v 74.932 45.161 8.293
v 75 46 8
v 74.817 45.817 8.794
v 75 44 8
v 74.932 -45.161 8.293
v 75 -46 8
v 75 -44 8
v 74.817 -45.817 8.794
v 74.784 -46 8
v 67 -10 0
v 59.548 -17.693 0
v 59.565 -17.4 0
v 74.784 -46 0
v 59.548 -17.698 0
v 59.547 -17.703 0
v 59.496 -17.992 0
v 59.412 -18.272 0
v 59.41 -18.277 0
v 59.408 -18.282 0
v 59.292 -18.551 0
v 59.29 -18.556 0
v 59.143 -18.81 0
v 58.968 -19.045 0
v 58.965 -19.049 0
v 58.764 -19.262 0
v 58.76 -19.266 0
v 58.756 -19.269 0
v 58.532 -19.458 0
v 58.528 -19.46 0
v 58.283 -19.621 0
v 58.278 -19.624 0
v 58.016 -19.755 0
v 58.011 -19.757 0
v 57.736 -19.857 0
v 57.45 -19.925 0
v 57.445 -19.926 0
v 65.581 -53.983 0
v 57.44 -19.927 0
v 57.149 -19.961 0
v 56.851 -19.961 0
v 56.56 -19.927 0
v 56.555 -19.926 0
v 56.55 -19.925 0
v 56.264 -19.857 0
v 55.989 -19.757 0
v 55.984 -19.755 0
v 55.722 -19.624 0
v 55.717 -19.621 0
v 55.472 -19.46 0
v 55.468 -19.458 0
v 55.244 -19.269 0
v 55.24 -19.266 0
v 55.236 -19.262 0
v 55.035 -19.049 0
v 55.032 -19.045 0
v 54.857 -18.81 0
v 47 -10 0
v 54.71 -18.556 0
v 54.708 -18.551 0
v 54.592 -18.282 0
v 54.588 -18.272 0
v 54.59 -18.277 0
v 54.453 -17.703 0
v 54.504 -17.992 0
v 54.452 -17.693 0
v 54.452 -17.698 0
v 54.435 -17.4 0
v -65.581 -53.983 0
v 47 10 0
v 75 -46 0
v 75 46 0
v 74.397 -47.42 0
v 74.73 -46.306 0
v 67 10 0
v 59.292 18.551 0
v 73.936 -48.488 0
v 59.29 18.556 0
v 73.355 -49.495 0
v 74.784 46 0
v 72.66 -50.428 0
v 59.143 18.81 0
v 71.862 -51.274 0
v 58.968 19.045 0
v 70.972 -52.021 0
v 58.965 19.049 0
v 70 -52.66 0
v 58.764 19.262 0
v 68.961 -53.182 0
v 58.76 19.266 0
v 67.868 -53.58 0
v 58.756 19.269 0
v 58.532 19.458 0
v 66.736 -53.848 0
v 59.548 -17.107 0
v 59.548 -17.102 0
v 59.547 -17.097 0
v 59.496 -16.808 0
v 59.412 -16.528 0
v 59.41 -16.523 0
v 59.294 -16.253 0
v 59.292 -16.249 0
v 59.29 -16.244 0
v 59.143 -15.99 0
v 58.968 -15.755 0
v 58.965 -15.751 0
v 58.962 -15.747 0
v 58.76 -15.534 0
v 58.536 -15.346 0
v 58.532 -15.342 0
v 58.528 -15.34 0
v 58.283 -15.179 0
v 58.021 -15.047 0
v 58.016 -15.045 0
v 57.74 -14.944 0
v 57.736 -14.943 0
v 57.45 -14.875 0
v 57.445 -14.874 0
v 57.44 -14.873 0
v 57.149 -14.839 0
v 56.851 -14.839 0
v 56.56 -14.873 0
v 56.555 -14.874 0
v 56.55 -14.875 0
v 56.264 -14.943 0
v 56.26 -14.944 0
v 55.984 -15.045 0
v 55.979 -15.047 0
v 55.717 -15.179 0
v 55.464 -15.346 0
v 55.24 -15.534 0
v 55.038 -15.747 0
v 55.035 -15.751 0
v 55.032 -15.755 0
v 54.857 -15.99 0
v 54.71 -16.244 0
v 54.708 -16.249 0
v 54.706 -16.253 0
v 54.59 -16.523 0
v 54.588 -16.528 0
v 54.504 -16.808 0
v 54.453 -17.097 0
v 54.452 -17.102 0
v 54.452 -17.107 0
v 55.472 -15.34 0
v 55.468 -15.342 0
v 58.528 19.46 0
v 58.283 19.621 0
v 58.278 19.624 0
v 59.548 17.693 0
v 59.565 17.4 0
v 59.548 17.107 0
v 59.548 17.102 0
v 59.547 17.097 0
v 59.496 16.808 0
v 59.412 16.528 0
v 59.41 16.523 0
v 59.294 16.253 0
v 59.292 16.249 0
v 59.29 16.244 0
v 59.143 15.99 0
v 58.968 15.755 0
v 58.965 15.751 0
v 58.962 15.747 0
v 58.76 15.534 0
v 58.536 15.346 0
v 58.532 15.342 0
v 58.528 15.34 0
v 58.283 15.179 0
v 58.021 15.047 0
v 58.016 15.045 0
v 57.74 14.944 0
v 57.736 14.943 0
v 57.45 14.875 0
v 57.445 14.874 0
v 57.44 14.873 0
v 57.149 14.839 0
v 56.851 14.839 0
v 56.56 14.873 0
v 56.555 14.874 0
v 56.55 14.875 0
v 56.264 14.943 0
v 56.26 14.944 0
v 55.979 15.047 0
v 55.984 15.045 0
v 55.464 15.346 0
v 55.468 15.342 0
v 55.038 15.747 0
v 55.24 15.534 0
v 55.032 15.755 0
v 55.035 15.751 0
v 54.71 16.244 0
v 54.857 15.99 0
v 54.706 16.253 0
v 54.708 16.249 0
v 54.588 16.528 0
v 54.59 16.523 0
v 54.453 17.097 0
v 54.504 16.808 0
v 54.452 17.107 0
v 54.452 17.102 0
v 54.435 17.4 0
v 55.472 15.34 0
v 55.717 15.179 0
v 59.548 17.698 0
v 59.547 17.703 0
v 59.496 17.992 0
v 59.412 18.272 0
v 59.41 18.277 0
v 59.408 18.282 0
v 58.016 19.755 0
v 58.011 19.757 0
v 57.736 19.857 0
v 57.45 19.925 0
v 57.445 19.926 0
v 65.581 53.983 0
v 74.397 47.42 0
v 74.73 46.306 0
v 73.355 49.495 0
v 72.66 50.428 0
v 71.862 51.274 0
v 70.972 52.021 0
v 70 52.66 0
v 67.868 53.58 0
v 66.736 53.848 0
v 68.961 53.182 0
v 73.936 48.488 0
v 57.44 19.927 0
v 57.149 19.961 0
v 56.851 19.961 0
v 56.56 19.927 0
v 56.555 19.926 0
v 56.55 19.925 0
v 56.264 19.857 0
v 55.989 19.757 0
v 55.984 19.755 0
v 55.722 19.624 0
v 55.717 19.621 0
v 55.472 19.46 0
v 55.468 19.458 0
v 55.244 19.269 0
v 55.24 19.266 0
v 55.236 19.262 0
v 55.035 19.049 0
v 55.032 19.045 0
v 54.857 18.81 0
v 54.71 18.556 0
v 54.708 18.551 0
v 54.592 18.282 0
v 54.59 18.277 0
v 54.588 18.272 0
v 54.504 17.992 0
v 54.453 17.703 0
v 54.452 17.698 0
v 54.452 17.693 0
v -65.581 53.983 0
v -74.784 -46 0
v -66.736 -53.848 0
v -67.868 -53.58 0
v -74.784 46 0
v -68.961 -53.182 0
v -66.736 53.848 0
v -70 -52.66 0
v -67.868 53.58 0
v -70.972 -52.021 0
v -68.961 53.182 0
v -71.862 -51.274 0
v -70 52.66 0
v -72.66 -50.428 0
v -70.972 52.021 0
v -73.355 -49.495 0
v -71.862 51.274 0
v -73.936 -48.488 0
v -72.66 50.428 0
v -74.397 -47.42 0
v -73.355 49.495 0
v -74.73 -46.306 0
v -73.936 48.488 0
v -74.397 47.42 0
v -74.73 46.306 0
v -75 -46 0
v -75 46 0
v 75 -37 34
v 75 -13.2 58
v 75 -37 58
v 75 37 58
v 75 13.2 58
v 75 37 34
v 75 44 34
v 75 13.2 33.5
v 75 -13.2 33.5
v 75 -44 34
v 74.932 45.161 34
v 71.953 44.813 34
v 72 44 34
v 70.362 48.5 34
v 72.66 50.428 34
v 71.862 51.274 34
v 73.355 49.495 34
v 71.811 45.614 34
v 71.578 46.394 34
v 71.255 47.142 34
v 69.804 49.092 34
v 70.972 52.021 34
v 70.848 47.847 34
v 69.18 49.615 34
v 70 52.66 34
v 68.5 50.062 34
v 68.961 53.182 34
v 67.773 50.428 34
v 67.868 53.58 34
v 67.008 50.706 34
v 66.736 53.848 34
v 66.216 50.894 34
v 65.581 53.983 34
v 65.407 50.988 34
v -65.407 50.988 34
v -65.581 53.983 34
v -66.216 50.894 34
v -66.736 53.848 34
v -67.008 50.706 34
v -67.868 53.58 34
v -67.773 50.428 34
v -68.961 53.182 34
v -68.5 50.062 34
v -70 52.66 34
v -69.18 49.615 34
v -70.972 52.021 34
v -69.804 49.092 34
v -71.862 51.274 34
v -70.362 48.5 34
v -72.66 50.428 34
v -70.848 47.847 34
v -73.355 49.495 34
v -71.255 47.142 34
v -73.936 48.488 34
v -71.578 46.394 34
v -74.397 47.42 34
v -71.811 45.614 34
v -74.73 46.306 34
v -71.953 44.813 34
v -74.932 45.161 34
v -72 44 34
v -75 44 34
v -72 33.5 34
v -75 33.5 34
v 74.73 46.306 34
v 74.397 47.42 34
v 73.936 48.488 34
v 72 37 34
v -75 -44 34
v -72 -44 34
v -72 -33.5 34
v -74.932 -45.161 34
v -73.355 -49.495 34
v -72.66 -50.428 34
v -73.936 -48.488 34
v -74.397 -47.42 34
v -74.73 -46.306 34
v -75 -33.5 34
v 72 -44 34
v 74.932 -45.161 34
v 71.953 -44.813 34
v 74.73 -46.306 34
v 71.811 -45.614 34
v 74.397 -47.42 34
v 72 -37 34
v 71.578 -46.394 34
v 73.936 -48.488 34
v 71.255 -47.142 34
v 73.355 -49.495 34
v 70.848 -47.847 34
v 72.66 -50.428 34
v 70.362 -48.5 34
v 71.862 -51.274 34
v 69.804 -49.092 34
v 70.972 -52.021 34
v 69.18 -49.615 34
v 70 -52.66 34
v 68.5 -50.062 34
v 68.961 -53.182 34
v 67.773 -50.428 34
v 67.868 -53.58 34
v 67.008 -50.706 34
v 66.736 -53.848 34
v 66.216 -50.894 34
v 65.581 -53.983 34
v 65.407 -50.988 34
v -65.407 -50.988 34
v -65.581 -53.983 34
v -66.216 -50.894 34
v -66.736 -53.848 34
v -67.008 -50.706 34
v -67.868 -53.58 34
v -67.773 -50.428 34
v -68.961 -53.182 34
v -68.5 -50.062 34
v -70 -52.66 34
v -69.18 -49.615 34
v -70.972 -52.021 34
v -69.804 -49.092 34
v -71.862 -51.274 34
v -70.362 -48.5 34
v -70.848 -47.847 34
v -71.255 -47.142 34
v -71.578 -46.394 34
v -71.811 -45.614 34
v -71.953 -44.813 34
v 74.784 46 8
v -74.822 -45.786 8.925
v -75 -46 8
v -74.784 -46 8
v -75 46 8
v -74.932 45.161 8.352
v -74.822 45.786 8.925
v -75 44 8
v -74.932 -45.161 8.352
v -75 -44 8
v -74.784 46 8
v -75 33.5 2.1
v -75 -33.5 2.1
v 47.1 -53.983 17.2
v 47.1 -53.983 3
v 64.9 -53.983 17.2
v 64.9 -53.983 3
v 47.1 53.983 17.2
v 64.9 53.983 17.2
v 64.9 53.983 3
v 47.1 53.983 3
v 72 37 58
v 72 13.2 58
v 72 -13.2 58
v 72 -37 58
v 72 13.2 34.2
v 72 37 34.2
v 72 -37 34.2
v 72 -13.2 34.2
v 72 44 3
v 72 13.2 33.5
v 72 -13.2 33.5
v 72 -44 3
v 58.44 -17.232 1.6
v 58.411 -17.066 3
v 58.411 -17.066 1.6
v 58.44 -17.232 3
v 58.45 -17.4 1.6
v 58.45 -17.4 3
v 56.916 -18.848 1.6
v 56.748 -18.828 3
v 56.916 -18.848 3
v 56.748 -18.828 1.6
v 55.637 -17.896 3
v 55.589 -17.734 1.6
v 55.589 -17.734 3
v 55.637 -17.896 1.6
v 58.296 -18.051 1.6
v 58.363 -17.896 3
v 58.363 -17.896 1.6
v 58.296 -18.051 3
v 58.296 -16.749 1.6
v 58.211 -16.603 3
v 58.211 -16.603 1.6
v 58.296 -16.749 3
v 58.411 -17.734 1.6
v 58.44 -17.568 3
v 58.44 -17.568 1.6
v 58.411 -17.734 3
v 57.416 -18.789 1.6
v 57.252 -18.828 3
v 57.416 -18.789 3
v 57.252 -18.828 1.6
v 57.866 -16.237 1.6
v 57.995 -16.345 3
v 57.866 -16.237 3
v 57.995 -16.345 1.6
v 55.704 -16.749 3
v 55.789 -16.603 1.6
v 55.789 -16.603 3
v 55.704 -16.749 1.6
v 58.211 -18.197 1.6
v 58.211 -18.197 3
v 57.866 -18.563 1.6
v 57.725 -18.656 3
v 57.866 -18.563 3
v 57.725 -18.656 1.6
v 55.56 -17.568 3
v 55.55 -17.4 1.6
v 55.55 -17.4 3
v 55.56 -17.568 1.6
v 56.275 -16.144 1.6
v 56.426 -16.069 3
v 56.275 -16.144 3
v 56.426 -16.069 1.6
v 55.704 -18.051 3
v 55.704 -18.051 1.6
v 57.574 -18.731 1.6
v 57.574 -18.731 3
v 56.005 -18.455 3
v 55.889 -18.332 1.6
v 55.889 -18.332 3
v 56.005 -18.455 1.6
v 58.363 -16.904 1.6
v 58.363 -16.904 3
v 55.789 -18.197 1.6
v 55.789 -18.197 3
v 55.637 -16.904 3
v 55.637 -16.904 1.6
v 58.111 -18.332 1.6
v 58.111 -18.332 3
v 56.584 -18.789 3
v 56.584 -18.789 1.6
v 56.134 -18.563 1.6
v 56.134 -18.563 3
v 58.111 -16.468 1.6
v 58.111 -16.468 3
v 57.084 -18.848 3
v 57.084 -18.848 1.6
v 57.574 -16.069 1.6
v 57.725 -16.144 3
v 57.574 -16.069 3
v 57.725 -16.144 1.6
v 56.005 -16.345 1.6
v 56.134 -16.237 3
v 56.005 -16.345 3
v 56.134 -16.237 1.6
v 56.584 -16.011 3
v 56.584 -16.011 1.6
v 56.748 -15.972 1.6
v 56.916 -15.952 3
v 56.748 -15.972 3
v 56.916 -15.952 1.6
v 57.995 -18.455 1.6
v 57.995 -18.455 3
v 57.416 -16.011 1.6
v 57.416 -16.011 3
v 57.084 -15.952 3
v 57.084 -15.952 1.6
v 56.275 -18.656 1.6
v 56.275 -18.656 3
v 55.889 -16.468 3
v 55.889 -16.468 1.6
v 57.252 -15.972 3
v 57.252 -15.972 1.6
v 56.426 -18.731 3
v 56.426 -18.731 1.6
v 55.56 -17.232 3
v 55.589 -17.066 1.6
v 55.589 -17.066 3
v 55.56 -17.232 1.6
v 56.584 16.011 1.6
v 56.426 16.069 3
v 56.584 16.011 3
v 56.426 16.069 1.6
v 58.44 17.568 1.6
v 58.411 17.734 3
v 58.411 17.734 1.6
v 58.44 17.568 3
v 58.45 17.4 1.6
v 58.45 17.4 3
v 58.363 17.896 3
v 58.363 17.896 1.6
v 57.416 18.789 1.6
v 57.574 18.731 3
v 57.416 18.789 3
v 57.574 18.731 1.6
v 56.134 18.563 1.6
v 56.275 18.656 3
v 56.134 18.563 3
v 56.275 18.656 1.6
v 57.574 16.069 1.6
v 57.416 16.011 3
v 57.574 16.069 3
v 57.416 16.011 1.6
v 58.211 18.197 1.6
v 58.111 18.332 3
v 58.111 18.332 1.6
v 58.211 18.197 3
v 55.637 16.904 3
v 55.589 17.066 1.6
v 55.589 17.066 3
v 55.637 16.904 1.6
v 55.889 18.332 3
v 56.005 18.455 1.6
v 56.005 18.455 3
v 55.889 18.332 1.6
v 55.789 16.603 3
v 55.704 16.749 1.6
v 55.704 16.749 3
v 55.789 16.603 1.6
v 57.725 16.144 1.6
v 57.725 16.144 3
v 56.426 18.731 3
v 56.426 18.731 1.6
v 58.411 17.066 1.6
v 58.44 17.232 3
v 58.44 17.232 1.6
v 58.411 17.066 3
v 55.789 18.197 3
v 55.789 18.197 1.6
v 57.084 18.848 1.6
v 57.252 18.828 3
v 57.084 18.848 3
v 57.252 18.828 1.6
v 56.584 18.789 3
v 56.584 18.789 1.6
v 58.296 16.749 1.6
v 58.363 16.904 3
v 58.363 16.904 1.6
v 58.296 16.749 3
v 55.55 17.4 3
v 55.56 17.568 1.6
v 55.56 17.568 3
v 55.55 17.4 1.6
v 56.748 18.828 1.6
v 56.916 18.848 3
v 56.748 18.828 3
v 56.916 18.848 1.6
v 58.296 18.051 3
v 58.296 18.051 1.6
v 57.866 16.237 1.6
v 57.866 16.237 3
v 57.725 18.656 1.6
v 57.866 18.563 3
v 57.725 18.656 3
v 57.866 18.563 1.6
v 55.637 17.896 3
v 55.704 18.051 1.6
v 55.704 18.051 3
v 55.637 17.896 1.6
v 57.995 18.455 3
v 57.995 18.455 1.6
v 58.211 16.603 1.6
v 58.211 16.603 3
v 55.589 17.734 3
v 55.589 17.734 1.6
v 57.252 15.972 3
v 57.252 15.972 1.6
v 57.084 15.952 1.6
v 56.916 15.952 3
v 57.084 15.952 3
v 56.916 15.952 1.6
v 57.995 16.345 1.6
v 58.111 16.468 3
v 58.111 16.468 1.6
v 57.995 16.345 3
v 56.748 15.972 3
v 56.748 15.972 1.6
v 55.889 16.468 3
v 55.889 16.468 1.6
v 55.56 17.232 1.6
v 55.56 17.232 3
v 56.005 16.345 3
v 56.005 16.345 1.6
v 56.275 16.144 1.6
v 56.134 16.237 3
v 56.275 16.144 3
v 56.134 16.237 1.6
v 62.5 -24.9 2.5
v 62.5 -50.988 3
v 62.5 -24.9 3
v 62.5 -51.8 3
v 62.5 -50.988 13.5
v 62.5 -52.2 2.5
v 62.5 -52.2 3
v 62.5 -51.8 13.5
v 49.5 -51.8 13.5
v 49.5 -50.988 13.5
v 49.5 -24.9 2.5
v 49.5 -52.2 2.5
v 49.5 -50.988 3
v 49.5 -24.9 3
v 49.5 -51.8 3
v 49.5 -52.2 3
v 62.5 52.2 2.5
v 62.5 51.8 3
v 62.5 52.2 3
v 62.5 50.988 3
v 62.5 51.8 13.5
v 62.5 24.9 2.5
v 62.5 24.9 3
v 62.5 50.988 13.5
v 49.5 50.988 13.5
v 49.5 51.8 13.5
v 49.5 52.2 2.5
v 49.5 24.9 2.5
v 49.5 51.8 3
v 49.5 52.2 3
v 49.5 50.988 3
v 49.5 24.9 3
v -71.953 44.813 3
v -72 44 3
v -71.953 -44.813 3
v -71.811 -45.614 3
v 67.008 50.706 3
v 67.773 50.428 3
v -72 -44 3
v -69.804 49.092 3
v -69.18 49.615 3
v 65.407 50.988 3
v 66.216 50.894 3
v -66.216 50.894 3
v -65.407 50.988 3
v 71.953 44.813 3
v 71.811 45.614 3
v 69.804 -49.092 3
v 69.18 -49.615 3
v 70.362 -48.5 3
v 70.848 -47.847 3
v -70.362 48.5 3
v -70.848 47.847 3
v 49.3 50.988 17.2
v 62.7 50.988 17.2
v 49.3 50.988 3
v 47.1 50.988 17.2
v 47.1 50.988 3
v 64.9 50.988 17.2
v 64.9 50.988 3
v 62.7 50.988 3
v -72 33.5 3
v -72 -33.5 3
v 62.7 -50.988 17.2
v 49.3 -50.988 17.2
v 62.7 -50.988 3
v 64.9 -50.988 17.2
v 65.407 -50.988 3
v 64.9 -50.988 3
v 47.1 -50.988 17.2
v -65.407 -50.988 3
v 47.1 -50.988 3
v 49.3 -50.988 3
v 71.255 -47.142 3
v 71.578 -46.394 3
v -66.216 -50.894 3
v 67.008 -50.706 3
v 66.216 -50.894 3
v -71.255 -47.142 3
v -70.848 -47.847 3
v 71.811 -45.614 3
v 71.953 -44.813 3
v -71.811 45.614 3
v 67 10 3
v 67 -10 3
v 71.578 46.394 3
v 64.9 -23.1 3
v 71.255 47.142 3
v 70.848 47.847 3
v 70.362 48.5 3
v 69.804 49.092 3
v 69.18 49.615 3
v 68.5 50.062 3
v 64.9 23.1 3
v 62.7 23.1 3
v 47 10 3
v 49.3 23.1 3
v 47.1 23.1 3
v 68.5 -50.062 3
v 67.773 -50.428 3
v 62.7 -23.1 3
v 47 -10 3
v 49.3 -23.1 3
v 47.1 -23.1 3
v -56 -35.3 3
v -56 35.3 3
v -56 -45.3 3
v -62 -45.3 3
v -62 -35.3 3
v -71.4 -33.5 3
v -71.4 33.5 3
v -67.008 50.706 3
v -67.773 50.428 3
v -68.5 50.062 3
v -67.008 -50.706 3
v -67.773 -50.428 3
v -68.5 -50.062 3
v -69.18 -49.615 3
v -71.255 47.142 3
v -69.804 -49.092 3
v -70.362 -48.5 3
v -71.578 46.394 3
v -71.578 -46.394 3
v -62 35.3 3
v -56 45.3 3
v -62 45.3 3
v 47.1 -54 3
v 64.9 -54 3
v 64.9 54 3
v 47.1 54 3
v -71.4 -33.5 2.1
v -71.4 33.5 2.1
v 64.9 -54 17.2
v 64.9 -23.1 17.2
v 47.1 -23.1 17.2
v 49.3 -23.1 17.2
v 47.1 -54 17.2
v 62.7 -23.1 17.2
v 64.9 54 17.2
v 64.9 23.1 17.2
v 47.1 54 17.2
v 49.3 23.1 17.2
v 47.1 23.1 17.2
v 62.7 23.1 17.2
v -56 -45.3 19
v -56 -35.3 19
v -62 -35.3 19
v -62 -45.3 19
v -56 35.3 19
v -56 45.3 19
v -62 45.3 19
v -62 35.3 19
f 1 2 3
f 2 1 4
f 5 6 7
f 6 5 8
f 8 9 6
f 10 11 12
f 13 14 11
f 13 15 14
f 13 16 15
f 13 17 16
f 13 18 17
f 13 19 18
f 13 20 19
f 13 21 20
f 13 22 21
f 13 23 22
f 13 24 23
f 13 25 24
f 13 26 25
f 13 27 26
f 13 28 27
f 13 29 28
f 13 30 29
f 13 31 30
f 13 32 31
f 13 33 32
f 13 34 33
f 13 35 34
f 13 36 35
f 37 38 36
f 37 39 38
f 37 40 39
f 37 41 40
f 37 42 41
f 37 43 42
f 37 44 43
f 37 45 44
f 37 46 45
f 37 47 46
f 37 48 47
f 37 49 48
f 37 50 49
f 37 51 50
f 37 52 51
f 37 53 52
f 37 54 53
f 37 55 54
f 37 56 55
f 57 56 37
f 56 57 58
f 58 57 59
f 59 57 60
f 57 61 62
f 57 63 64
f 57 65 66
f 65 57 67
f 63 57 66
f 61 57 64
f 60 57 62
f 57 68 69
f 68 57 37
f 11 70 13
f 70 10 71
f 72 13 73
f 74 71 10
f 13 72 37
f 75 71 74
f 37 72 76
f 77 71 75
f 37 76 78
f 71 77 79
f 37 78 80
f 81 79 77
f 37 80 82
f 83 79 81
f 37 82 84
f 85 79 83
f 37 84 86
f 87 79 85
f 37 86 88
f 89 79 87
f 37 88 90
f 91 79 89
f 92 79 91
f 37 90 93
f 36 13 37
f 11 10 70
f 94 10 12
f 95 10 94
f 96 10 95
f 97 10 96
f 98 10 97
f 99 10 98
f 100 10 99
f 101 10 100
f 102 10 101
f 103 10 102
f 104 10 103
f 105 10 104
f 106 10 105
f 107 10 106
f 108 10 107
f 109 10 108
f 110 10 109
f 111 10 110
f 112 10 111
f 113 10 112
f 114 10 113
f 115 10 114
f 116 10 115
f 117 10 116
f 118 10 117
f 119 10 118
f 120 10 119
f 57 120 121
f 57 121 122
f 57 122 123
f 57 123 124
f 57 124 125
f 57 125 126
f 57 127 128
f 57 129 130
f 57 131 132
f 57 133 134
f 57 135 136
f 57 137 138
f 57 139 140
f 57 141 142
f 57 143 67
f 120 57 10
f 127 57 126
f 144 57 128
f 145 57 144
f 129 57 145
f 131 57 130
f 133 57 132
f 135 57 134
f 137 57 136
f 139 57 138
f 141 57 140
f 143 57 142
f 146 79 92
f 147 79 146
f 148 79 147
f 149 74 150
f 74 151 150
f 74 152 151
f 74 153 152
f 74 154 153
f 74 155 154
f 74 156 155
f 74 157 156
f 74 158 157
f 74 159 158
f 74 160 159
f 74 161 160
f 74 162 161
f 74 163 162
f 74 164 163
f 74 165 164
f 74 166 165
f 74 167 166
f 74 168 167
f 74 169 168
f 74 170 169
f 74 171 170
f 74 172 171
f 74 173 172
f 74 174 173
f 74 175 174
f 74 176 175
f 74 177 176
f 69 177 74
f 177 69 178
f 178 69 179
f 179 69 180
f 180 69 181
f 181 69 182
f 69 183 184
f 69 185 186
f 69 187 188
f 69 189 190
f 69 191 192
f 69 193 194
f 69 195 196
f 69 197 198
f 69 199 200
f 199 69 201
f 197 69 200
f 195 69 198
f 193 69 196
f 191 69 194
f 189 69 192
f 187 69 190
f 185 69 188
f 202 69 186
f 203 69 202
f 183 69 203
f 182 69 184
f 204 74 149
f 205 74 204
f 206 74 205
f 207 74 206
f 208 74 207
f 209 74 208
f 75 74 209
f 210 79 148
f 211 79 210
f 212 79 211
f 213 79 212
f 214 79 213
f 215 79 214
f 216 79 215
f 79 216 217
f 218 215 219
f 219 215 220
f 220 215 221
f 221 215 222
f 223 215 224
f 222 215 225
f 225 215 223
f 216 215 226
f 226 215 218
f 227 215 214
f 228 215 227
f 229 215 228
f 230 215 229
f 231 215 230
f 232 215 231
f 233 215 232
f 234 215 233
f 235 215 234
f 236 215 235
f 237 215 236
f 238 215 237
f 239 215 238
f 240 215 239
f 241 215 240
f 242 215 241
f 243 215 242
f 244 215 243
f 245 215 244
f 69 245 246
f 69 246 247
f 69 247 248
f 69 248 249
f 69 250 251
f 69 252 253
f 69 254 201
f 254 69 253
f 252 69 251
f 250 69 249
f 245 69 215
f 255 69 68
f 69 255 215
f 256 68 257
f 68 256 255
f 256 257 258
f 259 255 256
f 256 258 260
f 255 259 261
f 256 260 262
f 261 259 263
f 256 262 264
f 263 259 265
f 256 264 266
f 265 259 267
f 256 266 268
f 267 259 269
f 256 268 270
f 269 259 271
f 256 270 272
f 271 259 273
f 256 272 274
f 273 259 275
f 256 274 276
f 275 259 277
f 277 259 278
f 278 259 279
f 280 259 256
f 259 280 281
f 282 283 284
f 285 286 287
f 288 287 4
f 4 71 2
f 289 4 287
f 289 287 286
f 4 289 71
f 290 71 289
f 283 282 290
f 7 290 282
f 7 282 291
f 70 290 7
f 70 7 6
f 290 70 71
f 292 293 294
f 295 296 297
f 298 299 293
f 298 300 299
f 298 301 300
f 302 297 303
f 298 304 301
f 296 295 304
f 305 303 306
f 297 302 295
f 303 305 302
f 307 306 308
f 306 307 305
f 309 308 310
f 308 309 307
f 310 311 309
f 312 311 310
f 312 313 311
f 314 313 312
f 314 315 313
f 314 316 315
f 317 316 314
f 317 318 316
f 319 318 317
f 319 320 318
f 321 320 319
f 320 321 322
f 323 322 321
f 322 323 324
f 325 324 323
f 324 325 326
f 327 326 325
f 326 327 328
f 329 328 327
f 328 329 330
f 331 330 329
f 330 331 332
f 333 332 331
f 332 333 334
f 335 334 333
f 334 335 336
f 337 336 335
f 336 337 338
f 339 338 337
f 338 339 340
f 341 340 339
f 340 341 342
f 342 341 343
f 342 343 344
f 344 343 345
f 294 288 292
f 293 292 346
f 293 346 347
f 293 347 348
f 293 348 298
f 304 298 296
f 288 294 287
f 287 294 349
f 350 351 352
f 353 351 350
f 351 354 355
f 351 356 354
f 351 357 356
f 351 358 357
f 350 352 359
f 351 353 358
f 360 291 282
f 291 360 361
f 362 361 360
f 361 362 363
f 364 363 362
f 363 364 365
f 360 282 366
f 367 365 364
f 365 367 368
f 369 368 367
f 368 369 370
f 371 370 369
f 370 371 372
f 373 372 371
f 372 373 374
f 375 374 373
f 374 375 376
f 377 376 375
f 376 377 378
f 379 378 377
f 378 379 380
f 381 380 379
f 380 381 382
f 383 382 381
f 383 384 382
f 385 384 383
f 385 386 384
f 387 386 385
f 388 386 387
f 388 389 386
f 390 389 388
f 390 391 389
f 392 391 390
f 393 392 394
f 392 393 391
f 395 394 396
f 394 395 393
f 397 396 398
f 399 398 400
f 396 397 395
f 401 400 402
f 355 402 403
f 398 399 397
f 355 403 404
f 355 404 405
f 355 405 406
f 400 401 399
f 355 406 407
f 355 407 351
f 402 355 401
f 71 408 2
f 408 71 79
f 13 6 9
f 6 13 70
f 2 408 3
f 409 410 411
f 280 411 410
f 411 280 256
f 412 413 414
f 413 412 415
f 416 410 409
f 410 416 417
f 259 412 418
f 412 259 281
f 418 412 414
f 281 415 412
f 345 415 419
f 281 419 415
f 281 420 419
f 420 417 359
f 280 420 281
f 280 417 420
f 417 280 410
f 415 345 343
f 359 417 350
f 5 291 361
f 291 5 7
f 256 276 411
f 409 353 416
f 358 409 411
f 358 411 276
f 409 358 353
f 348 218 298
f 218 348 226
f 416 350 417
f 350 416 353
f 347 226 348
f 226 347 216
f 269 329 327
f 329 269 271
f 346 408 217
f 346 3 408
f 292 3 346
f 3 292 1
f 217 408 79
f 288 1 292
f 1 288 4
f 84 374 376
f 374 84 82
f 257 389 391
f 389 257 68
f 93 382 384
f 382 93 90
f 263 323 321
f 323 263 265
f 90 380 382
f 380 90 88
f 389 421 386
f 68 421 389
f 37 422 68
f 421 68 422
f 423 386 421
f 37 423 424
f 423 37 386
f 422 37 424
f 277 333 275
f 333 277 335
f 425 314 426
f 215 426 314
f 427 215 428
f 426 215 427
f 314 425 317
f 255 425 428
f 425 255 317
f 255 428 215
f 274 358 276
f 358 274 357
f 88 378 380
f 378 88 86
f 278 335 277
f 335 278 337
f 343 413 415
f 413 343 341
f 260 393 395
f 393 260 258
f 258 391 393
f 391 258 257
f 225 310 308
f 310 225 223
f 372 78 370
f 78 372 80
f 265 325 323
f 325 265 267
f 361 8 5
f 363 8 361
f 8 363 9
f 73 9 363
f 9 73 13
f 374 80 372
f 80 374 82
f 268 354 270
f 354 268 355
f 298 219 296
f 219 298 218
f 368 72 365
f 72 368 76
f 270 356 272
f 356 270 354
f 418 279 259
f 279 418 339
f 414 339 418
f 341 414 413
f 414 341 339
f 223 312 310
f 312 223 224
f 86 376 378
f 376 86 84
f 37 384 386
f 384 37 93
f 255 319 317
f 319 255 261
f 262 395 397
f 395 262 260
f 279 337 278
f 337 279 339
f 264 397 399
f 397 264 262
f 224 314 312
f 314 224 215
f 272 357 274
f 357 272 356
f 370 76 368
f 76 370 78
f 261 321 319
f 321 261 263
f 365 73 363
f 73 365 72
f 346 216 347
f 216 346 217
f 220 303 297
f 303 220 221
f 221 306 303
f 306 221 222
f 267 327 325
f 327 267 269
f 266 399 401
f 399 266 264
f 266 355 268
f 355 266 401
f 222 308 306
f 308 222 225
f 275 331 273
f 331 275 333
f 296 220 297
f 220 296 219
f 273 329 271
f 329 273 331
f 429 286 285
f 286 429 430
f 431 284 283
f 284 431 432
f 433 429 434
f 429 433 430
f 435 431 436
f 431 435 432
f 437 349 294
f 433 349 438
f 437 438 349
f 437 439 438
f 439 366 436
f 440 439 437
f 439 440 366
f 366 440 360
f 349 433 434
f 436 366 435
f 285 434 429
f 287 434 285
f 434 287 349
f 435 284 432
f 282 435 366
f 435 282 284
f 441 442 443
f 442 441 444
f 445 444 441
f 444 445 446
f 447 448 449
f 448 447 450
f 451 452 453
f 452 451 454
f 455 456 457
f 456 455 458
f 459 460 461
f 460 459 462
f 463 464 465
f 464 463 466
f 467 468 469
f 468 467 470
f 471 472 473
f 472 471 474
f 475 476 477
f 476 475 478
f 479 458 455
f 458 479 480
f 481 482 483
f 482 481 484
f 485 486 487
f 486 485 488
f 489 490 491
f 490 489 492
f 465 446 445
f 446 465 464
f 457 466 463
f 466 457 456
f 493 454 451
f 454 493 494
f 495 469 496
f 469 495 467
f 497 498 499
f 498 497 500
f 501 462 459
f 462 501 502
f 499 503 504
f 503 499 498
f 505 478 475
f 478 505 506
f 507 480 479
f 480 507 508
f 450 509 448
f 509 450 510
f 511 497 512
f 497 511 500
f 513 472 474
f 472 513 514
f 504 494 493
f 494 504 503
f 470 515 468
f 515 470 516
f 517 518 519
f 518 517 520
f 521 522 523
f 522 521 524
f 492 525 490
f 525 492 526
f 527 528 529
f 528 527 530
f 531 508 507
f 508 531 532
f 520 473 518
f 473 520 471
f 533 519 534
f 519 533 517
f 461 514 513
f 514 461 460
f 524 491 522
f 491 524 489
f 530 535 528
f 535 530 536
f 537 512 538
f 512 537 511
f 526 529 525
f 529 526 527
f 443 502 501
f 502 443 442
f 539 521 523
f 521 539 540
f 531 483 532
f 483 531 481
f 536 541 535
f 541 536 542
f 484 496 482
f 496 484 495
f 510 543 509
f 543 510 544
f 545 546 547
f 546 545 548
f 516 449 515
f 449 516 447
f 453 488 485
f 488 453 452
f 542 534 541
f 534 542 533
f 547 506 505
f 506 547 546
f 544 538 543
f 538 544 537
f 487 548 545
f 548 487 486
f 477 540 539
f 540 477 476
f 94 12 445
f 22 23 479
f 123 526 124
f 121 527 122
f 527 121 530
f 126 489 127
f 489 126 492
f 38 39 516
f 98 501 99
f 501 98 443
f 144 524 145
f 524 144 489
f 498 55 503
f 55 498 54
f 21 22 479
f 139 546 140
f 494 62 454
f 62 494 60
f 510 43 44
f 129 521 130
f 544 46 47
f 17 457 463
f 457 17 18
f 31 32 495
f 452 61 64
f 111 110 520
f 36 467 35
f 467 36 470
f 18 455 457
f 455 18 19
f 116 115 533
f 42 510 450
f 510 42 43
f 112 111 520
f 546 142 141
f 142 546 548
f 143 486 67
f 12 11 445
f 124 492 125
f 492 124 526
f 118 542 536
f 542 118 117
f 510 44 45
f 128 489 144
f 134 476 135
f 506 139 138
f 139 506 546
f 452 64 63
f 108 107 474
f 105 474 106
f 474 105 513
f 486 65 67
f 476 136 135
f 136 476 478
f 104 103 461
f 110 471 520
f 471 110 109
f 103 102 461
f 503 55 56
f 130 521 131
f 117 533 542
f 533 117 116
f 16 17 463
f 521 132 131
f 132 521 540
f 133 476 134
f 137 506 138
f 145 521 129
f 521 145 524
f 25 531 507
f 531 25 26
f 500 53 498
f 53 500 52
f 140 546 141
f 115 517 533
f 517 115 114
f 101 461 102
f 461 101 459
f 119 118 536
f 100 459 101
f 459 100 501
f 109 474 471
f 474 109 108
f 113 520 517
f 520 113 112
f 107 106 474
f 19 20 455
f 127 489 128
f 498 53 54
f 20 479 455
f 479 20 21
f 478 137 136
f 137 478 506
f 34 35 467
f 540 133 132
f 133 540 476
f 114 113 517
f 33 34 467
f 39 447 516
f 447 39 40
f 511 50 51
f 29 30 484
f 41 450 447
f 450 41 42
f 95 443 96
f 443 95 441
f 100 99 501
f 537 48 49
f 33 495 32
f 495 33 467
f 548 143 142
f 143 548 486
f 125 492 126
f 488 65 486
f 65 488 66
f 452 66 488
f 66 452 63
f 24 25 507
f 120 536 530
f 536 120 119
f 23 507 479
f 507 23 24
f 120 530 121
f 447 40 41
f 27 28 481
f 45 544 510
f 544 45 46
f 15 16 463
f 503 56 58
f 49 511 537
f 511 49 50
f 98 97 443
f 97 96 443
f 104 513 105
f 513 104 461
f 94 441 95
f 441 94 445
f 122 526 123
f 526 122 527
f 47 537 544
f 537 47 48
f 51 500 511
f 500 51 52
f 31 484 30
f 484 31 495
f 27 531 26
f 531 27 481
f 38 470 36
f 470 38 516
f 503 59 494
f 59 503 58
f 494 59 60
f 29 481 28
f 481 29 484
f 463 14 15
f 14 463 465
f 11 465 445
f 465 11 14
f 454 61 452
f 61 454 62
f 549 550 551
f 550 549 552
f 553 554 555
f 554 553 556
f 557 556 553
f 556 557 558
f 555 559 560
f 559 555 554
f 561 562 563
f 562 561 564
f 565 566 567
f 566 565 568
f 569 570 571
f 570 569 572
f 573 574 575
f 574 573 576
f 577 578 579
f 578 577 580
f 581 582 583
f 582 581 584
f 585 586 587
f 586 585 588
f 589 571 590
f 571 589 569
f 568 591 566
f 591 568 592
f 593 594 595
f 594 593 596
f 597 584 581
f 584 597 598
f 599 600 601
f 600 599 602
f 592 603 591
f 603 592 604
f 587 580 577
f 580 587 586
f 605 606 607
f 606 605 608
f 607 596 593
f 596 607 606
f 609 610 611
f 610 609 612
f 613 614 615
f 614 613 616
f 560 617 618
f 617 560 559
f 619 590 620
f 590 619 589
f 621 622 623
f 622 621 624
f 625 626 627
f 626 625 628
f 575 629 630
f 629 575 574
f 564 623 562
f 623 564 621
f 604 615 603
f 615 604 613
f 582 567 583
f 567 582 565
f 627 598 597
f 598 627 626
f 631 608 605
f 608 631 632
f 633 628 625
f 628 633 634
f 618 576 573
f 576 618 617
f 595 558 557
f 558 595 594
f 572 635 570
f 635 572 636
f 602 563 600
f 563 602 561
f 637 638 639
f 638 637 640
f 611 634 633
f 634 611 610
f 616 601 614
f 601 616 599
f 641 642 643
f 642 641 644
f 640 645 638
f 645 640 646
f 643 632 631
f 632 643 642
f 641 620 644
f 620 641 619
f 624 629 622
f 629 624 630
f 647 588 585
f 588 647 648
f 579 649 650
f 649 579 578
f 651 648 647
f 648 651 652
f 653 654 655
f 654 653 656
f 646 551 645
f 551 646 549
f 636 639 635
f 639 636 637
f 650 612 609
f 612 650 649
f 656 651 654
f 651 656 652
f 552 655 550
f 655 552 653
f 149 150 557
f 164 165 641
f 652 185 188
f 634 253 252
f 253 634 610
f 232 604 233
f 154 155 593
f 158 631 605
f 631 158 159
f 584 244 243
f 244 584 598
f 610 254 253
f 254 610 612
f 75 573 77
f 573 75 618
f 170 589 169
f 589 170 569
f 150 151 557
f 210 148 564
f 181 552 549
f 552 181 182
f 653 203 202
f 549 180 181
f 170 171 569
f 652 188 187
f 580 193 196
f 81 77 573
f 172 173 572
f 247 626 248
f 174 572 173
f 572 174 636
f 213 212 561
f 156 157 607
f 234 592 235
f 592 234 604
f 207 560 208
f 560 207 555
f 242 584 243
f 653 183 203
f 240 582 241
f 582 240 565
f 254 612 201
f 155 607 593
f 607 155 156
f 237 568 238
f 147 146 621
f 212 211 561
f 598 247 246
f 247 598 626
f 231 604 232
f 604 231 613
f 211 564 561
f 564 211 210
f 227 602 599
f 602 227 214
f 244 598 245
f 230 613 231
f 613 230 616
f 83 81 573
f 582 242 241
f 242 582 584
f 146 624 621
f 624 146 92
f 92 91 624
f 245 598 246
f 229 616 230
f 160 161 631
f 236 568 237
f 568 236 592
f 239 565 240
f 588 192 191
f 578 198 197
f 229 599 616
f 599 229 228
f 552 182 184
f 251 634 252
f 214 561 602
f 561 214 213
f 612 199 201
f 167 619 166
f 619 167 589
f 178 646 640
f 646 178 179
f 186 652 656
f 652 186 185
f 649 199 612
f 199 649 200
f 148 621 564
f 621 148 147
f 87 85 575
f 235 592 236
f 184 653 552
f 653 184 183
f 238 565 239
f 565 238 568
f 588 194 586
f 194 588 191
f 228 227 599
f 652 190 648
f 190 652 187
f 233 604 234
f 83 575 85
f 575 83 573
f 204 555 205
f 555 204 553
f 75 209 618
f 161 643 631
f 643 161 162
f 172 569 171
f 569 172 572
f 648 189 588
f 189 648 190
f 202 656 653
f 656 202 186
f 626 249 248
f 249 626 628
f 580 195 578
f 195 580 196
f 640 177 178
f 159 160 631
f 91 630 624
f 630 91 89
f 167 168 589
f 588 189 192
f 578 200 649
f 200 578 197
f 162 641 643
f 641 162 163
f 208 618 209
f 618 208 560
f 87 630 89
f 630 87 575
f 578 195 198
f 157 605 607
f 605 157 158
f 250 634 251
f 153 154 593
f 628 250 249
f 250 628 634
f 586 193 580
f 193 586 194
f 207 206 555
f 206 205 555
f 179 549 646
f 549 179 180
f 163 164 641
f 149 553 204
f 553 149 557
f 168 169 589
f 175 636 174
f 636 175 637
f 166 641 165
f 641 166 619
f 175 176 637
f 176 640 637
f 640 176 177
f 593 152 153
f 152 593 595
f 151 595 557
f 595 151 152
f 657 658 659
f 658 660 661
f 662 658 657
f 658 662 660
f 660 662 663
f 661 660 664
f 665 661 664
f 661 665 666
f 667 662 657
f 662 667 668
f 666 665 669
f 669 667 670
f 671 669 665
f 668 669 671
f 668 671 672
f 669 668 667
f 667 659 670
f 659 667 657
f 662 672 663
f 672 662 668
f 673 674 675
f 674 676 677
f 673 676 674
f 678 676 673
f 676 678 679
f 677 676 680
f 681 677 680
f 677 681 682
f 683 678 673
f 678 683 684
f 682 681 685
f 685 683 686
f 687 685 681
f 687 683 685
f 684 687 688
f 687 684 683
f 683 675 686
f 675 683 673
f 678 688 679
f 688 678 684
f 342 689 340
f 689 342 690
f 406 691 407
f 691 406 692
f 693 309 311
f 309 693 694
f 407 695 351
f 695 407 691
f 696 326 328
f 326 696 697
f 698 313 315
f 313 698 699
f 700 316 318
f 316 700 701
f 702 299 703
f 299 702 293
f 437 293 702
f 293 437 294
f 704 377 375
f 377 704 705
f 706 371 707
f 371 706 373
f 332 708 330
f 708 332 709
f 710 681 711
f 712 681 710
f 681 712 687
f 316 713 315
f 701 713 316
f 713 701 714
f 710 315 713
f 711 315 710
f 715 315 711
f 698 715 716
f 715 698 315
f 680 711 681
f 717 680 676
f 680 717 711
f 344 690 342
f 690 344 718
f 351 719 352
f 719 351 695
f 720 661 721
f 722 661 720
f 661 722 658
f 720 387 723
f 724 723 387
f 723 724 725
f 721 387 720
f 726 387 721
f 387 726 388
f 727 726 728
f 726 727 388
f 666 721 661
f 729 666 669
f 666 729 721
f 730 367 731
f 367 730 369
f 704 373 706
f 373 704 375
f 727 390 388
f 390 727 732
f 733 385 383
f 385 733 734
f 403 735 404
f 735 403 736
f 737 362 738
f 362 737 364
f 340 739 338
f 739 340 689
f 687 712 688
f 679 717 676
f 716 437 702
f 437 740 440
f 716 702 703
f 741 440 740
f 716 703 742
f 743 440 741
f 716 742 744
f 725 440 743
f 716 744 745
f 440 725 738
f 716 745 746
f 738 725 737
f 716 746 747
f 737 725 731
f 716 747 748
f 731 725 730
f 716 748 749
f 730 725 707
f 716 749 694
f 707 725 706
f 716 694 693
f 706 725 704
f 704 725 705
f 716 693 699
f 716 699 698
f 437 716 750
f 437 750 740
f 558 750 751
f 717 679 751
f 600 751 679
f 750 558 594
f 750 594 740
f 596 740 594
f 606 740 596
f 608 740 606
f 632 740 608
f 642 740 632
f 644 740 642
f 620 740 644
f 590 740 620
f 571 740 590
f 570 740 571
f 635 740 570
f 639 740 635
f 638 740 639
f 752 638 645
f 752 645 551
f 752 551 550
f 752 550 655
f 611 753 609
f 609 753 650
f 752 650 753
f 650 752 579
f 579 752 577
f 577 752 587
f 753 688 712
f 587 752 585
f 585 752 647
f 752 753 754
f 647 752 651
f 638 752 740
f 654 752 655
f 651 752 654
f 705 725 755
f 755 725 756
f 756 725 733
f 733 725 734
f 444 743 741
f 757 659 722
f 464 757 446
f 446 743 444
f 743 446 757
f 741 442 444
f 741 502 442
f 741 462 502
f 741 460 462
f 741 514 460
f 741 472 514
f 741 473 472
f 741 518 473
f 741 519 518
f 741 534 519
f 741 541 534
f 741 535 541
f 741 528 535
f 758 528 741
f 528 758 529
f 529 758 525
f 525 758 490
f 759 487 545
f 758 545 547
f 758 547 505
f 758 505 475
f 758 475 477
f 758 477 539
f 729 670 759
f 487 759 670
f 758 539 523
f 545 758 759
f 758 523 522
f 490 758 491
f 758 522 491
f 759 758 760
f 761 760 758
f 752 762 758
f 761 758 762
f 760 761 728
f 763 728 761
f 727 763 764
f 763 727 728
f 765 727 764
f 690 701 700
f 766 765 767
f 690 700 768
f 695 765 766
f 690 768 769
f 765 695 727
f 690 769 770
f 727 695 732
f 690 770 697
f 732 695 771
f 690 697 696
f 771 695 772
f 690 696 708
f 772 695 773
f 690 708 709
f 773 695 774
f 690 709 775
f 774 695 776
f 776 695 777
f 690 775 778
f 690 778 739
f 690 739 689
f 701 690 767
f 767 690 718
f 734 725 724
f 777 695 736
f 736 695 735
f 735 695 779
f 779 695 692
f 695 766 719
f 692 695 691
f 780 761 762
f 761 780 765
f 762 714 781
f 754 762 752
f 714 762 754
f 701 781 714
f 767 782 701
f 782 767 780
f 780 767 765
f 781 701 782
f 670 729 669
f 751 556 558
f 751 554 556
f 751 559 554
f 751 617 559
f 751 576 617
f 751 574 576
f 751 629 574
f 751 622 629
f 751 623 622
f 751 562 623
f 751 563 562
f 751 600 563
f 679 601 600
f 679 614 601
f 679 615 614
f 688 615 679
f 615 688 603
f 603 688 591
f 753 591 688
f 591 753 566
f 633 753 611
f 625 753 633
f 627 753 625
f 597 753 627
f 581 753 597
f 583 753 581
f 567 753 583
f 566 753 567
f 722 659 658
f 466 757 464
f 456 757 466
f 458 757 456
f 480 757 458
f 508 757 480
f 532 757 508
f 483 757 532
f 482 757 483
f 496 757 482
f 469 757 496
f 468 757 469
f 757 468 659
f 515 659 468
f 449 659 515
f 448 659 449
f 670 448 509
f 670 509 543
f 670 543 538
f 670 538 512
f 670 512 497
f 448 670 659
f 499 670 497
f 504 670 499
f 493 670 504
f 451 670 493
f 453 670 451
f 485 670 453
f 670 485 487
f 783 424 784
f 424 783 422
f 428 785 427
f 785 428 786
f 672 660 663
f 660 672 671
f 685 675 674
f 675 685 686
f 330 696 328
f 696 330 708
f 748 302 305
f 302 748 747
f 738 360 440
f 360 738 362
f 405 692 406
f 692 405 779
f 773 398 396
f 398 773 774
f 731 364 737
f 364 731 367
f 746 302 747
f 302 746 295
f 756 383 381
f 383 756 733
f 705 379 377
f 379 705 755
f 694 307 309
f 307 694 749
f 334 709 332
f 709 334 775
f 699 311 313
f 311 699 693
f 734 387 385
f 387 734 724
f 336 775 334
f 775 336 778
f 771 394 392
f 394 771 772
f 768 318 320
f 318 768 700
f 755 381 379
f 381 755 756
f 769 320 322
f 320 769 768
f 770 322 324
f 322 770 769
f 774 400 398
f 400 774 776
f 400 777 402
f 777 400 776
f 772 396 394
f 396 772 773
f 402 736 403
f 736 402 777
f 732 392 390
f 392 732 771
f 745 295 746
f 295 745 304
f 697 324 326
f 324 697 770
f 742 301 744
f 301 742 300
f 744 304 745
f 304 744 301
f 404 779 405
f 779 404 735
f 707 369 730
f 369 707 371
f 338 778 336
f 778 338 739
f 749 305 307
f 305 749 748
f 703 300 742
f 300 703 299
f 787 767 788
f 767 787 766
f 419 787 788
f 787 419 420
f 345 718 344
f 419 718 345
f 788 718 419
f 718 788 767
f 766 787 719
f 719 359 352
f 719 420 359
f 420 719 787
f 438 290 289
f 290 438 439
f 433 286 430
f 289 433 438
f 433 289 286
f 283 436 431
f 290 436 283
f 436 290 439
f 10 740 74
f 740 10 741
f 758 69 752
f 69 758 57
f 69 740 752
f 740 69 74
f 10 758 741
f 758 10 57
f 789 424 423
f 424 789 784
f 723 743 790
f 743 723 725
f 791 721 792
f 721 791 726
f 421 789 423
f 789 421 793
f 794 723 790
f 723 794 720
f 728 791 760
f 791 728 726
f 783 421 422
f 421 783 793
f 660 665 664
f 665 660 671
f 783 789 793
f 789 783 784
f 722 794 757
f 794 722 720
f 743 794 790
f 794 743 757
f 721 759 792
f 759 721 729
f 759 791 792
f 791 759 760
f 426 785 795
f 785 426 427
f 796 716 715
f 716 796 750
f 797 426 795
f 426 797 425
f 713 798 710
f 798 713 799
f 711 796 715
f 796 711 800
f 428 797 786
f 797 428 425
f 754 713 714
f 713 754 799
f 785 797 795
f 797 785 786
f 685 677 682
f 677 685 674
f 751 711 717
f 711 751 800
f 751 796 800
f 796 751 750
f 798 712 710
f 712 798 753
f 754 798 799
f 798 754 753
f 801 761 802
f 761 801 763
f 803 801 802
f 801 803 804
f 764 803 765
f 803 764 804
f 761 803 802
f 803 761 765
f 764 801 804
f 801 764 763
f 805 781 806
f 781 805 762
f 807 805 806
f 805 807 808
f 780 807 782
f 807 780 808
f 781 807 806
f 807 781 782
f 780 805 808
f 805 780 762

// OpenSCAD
// Printable main chassis core only.
// Use this for more reliable adhesion than printing the full multi-part layout.

use <chassis_n20.scad>;

render_chassis_variant("printable_core", 12);
